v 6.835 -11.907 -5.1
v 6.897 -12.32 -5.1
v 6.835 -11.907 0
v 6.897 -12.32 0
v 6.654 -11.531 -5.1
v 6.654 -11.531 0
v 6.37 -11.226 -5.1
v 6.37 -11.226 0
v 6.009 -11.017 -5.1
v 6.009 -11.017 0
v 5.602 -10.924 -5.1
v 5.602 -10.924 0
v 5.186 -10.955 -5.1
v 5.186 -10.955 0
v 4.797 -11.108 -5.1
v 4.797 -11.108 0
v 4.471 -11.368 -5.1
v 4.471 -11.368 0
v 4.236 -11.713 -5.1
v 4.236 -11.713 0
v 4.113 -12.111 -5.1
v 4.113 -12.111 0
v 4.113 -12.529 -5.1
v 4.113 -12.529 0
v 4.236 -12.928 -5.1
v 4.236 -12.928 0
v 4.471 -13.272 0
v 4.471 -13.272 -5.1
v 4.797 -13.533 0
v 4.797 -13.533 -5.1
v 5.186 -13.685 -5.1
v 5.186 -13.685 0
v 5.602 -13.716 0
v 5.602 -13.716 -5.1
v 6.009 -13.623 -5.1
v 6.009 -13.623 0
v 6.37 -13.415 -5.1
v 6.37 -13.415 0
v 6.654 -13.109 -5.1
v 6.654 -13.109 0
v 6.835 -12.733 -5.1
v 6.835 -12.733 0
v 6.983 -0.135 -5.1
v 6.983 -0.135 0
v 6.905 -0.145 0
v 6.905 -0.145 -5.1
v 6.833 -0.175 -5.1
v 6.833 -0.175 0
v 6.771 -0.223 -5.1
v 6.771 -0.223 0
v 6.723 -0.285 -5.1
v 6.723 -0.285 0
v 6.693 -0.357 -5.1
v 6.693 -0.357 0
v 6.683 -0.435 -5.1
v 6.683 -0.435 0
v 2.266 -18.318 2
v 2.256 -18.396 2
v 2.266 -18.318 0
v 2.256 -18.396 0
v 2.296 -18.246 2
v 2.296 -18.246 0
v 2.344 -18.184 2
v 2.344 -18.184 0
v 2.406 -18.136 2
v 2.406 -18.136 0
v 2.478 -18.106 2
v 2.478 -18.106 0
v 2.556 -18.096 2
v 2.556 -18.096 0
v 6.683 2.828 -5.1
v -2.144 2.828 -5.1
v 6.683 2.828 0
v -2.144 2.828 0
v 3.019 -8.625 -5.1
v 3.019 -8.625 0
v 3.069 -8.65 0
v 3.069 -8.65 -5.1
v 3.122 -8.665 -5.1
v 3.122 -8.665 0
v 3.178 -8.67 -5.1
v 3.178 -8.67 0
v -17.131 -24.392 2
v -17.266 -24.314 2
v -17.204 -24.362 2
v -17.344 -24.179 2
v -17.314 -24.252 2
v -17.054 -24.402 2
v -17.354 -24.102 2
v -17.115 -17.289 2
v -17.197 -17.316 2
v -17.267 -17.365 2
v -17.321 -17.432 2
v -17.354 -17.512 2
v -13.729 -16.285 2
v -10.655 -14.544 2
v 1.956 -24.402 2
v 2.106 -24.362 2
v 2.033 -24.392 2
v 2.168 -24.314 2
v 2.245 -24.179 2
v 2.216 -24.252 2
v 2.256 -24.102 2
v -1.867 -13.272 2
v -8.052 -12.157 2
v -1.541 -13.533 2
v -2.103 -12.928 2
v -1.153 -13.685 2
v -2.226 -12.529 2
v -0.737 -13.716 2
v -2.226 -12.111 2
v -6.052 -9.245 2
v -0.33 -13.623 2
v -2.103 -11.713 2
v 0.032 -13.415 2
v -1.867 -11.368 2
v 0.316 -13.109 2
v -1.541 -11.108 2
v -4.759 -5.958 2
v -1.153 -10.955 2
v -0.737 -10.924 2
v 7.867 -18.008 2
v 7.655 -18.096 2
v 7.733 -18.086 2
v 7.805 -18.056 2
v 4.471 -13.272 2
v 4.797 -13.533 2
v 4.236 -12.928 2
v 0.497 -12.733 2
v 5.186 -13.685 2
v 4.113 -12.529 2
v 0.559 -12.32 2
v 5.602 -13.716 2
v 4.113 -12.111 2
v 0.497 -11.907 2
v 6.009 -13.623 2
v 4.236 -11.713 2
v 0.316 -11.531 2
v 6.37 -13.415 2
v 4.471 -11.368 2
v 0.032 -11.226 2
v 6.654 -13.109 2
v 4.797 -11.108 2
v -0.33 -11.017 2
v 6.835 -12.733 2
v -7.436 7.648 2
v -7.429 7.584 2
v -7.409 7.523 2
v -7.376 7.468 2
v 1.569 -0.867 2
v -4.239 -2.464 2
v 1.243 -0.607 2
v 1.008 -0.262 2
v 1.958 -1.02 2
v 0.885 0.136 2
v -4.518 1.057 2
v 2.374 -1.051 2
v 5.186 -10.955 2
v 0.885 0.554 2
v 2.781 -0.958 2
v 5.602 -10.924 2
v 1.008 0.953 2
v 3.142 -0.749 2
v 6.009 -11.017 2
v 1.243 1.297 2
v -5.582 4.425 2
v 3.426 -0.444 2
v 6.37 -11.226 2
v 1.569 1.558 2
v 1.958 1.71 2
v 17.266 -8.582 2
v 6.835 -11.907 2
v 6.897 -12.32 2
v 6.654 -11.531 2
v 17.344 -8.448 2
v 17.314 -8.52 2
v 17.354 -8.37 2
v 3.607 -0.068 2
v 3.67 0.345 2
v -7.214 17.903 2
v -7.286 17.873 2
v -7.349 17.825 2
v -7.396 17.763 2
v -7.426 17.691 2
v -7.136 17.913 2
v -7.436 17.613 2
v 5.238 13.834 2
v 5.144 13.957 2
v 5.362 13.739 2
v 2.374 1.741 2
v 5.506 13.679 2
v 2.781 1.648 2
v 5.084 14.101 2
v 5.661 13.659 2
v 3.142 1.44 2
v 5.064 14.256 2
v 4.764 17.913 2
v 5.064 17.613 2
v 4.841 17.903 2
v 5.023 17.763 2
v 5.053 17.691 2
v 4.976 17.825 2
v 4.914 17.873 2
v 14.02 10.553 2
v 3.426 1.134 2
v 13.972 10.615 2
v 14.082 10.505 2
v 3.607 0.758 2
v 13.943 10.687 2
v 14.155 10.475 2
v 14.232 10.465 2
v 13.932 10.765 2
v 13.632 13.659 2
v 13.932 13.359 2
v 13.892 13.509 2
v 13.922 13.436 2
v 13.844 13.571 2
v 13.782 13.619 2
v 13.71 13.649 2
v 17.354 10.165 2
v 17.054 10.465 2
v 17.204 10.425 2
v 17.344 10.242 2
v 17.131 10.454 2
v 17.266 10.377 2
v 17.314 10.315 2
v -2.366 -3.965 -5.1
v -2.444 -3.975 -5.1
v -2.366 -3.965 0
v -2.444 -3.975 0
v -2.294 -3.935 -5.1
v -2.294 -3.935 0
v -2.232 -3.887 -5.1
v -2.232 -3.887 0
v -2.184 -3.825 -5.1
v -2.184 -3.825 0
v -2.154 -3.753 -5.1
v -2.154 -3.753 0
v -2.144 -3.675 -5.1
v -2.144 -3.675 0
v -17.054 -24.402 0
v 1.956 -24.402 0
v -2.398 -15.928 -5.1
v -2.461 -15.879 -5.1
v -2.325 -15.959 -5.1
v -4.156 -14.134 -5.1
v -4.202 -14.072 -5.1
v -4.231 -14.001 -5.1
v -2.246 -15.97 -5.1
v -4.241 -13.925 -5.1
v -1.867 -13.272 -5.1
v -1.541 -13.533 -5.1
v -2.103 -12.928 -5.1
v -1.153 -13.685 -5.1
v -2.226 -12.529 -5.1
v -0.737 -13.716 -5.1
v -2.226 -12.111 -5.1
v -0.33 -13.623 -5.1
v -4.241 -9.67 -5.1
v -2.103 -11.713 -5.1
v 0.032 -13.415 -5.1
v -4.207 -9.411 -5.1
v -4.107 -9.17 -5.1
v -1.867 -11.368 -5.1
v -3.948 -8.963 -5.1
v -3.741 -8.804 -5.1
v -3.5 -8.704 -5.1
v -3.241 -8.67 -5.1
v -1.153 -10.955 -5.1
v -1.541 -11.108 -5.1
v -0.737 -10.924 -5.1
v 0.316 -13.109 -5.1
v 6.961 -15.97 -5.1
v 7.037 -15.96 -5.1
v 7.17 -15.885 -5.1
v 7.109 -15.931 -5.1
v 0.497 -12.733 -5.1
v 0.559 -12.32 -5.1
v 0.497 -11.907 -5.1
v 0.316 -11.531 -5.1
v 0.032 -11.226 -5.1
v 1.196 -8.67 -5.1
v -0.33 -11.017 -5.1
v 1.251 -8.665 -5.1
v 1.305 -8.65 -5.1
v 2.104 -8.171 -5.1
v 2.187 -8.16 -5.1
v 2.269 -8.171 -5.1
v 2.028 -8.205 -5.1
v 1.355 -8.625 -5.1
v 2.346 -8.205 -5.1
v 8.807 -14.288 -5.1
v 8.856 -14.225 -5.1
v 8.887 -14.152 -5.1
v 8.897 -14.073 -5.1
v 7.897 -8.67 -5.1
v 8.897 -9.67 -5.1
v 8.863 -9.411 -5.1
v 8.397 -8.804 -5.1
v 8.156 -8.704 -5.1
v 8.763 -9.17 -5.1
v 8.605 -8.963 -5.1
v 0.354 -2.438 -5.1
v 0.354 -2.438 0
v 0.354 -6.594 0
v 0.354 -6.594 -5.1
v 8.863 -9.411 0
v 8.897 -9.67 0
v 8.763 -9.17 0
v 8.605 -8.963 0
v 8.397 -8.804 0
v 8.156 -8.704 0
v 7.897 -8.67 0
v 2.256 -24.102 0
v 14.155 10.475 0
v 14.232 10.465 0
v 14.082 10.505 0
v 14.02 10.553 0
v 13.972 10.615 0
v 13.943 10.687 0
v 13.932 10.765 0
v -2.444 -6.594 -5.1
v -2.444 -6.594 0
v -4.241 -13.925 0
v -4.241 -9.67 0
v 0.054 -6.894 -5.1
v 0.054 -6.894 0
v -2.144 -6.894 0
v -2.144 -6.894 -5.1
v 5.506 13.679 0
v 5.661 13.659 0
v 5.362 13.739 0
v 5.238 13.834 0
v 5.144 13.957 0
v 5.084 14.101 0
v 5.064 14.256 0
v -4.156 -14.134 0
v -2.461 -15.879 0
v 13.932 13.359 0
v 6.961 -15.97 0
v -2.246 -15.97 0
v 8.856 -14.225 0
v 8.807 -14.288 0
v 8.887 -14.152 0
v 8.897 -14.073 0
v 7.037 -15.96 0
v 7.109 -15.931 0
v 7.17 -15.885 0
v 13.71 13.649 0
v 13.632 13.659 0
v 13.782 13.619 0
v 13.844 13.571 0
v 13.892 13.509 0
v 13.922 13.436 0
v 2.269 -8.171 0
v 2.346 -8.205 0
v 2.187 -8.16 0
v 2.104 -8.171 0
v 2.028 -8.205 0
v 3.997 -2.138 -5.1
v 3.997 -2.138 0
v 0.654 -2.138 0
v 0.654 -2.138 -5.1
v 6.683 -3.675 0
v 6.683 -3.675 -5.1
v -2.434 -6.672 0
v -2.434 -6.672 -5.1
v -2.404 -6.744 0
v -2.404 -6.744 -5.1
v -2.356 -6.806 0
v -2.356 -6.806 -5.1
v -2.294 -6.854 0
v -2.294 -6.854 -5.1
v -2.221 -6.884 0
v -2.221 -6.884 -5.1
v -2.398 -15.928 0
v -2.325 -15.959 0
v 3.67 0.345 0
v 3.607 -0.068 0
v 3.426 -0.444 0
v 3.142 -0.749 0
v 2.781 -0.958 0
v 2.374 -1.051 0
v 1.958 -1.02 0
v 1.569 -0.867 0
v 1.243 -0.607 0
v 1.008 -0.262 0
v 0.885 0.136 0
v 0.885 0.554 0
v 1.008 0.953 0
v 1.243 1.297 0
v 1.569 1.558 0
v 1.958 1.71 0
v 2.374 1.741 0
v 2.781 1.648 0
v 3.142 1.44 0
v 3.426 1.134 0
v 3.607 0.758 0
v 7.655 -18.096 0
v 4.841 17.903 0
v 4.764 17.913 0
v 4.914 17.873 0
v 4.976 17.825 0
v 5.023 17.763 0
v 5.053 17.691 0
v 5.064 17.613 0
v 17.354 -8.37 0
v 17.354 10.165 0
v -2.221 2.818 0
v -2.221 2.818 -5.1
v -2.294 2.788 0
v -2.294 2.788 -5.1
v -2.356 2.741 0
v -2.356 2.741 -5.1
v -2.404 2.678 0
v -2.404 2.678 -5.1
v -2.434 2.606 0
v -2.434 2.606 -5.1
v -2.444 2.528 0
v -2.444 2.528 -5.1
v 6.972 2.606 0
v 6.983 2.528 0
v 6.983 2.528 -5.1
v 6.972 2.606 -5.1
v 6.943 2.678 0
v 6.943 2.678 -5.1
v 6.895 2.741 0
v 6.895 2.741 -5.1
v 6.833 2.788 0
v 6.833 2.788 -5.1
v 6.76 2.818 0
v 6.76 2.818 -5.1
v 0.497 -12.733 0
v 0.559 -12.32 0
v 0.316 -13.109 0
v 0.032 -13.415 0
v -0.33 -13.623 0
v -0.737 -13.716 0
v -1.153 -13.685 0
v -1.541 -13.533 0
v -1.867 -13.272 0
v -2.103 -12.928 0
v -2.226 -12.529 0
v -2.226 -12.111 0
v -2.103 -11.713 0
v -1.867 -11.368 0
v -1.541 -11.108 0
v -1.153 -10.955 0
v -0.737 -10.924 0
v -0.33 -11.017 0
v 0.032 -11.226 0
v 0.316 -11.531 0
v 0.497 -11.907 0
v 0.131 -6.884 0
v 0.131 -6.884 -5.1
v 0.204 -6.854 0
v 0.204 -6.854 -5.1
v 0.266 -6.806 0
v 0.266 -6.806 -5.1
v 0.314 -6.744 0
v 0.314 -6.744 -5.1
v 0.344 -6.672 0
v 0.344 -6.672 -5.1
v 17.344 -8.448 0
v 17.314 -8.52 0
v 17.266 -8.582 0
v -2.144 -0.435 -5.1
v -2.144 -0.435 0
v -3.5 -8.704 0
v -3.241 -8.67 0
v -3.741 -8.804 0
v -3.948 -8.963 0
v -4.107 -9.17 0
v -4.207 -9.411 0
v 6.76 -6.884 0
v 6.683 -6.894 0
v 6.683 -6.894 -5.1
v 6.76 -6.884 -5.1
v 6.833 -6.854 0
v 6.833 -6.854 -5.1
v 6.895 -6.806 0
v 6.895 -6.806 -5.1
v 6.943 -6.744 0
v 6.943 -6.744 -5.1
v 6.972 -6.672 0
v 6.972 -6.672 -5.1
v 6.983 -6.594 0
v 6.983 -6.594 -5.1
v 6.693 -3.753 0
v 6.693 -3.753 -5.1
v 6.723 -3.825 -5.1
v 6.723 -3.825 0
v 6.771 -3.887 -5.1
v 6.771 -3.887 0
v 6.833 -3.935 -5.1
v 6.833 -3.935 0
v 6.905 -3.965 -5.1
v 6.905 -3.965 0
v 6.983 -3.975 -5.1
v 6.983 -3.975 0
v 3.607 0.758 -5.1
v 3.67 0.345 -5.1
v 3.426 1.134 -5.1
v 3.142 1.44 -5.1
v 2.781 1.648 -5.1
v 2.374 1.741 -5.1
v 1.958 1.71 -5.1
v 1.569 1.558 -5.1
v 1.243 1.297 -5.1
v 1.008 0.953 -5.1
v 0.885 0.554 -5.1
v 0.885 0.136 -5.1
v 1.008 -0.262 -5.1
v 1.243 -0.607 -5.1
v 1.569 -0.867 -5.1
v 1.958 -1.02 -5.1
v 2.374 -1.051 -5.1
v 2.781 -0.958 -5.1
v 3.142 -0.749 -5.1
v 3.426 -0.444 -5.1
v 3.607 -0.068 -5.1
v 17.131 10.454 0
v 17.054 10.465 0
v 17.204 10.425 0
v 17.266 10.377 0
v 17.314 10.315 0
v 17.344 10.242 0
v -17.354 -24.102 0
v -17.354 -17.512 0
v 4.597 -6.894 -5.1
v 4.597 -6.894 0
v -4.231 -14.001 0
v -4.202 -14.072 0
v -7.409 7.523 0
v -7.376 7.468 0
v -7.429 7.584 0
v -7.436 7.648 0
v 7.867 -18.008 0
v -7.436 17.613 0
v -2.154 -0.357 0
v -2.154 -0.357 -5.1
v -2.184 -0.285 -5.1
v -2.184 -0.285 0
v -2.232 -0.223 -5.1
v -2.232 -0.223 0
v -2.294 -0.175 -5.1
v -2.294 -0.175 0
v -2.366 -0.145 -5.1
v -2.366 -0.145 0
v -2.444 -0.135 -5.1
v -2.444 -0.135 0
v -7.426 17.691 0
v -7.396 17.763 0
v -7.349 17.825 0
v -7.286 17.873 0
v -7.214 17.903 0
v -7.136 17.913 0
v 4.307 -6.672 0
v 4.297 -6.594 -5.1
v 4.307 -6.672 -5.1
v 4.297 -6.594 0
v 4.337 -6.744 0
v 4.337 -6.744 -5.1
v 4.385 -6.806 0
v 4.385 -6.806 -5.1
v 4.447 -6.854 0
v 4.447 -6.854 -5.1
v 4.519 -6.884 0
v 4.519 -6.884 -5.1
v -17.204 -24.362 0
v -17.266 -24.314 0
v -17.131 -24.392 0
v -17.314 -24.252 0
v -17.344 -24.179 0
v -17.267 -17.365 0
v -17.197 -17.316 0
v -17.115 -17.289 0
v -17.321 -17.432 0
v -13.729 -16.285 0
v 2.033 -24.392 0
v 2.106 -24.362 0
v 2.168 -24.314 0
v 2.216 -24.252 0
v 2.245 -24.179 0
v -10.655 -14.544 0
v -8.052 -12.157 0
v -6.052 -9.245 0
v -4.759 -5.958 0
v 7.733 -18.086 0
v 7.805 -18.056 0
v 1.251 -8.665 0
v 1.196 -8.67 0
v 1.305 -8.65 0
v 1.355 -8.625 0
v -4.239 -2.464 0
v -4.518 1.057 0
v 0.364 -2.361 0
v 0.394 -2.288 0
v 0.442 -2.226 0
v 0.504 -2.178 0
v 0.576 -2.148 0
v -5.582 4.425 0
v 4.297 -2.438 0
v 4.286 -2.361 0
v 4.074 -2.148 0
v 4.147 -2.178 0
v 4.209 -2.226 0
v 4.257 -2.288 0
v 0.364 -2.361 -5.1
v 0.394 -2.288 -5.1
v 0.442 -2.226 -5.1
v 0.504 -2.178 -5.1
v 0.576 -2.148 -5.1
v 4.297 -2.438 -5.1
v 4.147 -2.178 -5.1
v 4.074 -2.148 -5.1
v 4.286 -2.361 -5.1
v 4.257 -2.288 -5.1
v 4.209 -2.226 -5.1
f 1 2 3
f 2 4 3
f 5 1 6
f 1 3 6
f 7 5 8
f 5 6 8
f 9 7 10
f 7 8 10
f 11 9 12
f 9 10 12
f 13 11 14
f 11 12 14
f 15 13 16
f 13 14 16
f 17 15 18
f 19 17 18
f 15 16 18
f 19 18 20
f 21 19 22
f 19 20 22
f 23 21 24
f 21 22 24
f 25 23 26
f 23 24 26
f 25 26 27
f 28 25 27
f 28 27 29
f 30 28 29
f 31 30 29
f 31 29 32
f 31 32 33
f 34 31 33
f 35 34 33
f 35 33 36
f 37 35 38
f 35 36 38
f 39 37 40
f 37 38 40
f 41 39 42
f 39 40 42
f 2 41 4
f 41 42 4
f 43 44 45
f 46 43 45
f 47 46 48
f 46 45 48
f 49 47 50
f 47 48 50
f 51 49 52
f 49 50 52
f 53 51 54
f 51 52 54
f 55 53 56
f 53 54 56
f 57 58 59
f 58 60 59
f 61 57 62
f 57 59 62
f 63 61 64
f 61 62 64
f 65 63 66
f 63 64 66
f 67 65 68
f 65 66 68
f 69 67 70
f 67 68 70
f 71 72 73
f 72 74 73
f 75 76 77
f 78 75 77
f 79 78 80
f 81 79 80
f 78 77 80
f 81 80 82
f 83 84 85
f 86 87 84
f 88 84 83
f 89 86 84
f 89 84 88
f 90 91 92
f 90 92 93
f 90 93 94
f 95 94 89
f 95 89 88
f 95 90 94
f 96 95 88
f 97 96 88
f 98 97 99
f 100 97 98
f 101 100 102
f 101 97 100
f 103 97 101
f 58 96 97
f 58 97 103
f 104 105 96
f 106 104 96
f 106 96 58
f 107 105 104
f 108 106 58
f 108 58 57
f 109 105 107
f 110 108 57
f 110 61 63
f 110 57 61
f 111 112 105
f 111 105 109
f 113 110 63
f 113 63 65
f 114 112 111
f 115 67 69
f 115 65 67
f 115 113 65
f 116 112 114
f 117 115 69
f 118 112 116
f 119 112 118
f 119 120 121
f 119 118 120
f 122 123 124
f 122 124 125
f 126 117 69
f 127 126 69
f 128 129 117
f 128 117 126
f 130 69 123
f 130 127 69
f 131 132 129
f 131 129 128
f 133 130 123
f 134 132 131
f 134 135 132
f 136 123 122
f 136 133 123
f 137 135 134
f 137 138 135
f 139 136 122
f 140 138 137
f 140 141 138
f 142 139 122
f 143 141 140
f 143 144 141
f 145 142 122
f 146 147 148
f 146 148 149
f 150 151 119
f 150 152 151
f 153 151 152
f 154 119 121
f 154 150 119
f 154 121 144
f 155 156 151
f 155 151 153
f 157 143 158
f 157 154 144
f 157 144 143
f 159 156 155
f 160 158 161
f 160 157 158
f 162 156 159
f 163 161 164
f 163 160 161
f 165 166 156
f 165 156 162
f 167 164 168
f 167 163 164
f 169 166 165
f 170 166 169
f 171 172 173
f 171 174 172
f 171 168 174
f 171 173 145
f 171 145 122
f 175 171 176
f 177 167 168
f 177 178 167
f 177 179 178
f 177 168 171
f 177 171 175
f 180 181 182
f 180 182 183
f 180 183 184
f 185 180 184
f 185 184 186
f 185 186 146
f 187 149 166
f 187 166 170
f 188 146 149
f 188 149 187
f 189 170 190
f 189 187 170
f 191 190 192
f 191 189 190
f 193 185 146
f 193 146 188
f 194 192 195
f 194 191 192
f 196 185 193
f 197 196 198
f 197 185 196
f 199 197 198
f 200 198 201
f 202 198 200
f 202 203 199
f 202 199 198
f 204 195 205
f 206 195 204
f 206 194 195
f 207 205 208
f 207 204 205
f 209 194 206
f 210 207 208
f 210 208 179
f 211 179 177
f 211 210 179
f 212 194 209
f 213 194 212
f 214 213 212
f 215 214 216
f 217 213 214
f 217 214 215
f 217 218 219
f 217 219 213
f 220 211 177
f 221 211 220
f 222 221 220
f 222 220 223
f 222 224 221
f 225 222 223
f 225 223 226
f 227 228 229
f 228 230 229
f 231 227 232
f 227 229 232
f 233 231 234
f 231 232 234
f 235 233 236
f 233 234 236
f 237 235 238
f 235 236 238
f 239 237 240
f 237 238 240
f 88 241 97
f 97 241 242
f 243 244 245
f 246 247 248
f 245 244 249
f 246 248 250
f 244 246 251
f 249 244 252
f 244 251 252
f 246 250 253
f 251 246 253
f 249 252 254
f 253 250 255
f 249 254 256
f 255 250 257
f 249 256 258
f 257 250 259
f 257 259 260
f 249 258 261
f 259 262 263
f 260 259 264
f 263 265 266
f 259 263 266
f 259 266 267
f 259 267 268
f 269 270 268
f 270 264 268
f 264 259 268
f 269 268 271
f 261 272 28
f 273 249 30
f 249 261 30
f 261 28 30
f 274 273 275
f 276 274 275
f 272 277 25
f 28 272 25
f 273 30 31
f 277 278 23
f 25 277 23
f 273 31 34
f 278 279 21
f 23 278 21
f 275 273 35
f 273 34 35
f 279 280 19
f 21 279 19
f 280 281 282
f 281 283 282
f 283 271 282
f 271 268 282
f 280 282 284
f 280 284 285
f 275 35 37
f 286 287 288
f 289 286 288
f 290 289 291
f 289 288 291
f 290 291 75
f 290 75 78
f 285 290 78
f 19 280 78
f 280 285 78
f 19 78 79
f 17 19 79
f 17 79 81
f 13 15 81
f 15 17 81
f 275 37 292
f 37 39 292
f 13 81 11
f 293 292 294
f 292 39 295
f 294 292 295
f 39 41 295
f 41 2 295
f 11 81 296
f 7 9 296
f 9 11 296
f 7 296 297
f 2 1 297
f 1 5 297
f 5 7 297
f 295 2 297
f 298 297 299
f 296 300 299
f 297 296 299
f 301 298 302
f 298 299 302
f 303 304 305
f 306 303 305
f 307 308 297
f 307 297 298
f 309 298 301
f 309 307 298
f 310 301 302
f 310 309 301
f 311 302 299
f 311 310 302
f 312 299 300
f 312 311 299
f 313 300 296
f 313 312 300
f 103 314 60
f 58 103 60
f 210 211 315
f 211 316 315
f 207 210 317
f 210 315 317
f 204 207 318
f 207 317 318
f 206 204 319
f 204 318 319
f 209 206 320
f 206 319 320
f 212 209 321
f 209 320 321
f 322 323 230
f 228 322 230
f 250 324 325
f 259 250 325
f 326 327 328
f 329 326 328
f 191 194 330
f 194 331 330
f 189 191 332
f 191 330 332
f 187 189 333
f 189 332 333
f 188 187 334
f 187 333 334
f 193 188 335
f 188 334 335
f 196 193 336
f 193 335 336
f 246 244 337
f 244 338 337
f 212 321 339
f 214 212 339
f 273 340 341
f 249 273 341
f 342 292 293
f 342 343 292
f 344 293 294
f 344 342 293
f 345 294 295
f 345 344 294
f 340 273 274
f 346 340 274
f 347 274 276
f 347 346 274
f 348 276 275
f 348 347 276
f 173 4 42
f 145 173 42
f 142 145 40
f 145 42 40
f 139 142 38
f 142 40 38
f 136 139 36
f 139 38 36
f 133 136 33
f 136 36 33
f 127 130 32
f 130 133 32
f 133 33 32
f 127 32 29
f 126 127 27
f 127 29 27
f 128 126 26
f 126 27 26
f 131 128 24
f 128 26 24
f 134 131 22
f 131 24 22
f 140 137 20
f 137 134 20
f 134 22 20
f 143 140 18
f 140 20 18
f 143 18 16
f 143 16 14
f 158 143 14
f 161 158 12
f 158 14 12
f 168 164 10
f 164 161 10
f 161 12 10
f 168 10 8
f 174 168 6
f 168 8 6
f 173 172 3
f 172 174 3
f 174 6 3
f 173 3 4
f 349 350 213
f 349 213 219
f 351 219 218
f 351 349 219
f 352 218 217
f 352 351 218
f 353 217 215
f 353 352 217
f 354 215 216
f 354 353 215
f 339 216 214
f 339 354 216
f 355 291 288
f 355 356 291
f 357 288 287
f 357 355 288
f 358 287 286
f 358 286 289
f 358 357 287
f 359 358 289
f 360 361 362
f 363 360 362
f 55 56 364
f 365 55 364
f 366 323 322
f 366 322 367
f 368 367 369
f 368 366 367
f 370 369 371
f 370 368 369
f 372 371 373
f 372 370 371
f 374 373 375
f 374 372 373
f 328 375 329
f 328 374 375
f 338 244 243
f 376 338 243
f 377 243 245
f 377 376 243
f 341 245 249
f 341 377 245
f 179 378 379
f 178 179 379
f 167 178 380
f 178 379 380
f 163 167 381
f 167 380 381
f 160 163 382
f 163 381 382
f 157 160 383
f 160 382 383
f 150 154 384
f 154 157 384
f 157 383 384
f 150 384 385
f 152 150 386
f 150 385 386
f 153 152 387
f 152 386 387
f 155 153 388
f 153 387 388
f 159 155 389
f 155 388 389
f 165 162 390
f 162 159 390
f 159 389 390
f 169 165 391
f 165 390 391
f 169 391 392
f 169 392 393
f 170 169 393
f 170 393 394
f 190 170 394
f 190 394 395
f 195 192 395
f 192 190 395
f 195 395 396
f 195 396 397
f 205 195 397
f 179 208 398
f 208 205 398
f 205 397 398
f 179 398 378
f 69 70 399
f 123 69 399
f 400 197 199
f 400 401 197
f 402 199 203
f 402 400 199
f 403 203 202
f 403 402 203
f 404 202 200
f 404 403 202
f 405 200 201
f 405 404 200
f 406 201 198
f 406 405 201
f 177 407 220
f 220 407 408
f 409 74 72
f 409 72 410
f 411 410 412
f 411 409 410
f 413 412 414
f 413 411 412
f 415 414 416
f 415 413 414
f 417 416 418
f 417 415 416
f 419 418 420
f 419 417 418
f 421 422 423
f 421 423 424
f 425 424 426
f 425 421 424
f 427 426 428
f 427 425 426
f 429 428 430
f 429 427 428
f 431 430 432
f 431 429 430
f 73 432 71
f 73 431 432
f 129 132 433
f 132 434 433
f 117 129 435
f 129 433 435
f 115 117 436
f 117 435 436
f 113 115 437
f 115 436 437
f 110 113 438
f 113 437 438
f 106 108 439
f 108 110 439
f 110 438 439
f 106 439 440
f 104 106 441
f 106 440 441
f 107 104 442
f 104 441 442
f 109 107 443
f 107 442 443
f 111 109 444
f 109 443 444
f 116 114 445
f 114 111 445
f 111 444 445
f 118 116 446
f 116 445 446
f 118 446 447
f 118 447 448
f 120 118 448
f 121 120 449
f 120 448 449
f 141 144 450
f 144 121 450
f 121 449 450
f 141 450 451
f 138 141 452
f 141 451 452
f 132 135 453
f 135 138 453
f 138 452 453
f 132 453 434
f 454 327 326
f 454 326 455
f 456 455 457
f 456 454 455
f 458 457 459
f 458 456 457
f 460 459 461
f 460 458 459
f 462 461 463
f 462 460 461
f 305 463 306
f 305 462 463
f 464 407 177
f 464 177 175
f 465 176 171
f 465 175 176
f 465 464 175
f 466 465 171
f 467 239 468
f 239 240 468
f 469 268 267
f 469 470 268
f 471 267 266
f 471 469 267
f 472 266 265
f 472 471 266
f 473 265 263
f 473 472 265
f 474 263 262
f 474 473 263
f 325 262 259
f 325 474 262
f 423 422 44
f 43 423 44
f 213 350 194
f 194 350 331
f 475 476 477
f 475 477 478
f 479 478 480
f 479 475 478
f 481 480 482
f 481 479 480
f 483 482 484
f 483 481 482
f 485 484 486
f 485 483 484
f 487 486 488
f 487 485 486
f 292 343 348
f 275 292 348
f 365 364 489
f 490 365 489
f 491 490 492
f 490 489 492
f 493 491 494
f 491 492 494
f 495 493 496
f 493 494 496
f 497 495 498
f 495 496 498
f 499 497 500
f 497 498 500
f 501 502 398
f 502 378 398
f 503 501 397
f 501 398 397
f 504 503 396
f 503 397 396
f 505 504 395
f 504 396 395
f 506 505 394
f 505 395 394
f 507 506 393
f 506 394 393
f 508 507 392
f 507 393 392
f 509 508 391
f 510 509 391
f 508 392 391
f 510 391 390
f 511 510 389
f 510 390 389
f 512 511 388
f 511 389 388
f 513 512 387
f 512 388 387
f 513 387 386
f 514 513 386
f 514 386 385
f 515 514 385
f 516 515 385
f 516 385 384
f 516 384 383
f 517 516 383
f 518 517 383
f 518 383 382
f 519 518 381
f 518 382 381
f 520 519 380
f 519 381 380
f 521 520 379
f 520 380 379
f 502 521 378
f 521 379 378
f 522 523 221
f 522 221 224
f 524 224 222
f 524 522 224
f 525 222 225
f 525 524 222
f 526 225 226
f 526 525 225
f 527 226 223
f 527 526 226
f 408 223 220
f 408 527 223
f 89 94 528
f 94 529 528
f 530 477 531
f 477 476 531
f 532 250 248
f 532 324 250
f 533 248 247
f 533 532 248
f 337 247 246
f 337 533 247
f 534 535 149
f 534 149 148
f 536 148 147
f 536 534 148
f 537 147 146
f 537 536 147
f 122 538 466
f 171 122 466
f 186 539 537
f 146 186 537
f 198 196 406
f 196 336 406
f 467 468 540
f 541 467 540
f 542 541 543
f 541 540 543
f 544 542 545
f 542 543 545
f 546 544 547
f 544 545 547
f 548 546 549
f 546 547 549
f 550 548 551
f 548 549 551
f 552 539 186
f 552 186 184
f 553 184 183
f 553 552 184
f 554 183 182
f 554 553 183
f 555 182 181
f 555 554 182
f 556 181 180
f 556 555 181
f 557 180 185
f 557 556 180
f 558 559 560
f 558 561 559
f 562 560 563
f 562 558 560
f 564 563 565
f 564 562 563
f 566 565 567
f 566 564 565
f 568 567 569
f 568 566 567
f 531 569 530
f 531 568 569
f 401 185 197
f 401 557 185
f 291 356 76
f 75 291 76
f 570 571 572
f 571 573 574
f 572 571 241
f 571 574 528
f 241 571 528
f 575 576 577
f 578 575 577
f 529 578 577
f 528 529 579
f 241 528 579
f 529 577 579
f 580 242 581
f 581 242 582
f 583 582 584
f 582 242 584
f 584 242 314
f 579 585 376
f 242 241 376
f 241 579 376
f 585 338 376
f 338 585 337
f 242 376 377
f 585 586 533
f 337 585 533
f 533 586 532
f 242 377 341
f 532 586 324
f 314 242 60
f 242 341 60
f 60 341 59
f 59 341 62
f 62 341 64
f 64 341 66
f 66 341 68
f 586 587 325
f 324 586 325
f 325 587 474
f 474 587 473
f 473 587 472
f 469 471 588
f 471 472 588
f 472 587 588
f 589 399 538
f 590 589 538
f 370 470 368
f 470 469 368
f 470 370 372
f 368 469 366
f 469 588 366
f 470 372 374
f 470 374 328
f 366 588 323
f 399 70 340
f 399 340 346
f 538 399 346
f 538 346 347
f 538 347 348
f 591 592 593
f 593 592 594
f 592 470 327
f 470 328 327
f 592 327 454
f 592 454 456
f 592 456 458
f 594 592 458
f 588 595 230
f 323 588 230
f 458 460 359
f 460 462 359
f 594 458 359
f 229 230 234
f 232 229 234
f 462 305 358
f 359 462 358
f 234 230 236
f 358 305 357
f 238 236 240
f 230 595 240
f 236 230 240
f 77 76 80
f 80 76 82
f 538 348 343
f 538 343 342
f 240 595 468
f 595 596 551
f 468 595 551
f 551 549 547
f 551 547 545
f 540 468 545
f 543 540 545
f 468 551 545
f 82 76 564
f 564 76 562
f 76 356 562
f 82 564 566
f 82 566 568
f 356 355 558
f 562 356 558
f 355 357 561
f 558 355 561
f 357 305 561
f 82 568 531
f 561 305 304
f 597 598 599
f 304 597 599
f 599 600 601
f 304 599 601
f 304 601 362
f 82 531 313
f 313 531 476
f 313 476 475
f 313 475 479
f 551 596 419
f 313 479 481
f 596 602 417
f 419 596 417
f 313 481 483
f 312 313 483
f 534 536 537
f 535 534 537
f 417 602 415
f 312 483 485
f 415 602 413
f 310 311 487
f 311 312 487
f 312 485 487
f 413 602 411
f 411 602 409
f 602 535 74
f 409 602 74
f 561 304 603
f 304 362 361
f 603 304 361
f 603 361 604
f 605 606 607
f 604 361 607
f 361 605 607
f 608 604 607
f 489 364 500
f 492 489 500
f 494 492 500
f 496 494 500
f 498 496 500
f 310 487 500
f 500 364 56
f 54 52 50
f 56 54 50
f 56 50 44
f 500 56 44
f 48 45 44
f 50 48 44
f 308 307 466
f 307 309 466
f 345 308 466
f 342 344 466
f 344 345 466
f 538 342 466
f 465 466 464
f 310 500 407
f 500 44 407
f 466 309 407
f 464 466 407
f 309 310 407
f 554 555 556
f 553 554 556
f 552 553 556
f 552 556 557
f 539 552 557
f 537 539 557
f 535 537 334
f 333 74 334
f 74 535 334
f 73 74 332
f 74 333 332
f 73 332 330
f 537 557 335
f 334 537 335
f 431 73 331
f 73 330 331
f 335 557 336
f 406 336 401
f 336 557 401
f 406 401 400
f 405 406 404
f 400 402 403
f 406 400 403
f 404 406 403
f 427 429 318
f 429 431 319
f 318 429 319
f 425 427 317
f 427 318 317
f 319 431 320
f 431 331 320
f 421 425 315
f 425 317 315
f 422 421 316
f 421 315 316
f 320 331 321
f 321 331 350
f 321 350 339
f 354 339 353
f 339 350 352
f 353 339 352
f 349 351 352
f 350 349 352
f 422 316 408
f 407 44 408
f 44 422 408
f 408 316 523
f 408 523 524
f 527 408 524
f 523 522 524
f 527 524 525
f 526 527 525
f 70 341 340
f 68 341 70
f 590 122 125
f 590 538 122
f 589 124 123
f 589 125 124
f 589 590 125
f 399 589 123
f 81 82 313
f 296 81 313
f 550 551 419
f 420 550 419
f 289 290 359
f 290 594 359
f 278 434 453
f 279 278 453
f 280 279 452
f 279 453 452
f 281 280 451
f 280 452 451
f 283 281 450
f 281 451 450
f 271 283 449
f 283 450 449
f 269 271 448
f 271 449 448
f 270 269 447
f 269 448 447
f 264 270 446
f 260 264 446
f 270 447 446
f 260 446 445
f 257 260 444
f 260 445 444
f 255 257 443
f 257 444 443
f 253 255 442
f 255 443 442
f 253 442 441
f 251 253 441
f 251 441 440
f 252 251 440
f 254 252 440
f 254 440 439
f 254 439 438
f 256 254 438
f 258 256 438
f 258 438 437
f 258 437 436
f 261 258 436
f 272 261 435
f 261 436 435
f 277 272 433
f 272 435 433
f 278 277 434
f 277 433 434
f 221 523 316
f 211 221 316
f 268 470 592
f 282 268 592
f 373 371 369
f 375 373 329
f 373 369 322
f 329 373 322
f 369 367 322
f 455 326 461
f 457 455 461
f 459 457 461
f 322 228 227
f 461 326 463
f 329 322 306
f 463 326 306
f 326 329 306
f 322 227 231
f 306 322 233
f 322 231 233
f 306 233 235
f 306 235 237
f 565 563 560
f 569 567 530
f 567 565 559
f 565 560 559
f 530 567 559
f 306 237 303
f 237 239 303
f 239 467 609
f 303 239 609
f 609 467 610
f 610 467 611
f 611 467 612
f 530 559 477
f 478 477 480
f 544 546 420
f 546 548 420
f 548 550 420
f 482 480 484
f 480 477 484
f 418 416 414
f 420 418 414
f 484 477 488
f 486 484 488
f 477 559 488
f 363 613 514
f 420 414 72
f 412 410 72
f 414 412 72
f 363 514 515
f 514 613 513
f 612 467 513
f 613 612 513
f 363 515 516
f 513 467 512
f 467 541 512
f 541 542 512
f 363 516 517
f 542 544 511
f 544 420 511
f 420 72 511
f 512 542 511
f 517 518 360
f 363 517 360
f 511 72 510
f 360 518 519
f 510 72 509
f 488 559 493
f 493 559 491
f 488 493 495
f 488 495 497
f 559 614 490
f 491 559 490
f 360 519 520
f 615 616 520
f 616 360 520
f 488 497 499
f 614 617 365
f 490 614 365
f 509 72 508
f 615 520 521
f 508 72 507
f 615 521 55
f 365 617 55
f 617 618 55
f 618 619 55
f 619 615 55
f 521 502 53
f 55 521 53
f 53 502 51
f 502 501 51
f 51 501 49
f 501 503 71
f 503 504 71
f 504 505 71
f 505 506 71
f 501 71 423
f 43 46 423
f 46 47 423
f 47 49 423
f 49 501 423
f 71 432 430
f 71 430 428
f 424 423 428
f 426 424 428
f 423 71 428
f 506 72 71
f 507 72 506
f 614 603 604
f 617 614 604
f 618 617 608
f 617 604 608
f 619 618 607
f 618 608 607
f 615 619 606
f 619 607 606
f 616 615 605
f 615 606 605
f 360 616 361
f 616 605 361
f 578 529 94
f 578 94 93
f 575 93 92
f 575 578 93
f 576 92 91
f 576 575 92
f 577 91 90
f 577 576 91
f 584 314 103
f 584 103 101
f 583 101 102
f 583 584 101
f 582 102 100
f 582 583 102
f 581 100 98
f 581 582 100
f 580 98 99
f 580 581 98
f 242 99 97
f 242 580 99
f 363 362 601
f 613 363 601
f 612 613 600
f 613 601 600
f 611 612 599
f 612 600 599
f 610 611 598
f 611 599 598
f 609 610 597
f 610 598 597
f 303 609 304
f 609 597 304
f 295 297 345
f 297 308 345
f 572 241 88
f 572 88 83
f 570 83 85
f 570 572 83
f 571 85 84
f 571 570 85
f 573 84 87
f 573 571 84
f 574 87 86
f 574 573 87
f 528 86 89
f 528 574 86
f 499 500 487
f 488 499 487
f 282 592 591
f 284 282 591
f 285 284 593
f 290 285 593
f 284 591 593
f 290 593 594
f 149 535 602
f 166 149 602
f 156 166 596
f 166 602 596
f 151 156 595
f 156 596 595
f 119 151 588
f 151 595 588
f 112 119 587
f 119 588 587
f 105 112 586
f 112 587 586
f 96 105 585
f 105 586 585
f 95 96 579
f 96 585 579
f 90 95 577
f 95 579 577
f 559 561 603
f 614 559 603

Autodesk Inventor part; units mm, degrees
ref_plane "YZ Plane" through (0, 0, 0) normal (1, 0, 0) x (0, 1, 0)
ref_plane "Work Plane1" through (-17.3538, -25.3153, -5.1) normal (0, 0, 1) x (1, 0, 0)
sketch "holes" plane through (0, 0, 0) normal (0, 0, 1) x (1, 0, 0)
  arc A0 (17.3538, 10.1647) -> (17.0538, 10.4647) centre (17.0538, 10.1647) ccw
  line L0 (17.0538, 10.4647) -> (14.2323, 10.4647)
  arc A1 (13.9323, 10.7647) -> (14.2323, 10.4647) centre (14.2323, 10.7647) ccw
  line L1 (13.9323, 10.7647) -> (13.9323, 13.3588)
  arc A2 (13.9323, 13.3588) -> (13.6323, 13.6588) centre (13.6323, 13.3588) ccw
  line L2 (13.6323, 13.6588) -> (5.6606, 13.6588)
  arc A3 (5.0636, 14.2558) -> (5.6606, 13.6588) centre (5.6606, 14.2558) ccw
  line L3 (5.0636, 14.2558) -> (5.0636, 17.6129)
  arc A4 (5.0636, 17.6129) -> (4.7636, 17.9129) centre (4.7636, 17.6129) ccw
  line L4 (4.7636, 17.9129) -> (-1.9383, 17.9129)
  arc A5 (-2.2383, 18.2129) -> (-1.9383, 17.9129) centre (-1.9383, 18.2129) ccw
  line L5 (-2.2383, 18.2129) -> (-2.2383, 18.3742)
  arc A6 (-2.2383, 18.3742) -> (-2.5383, 18.6742) centre (-2.5383, 18.3742) ccw
  line L6 (-2.5383, 18.6742) -> (-3.5364, 18.6742)
  arc A7 (-3.8364, 18.9742) -> (-3.5364, 18.6742) centre (-3.5364, 18.9742) ccw
  line L7 (-3.8364, 18.9742) -> (-3.8364, 19.9671)
  arc A8 (-3.8364, 19.9671) -> (-4.1364, 20.2671) centre (-4.1364, 19.9671) ccw
  line L8 (-4.1364, 20.2671) -> (-5.1364, 20.2671)
  arc A9 (-5.4364, 20.5671) -> (-5.1364, 20.2671) centre (-5.1364, 20.5671) ccw
  line L9 (-5.4364, 20.5671) -> (-5.4364, 24.1018)
  arc A10 (-5.4364, 24.1018) -> (-5.7364, 24.4018) centre (-5.7364, 24.1018) ccw
  line L10 (-5.7364, 24.4018) -> (-7.1364, 24.4018)
  arc A11 (-7.1364, 24.4018) -> (-7.4364, 24.1018) centre (-7.1364, 24.1018) ccw
  line L11 (-7.4364, 24.1018) -> (-7.4364, 7.6483)
  arc A12 (-7.4364, 7.6483) -> (-7.3759, 7.4677) centre (-7.1364, 7.6483) ccw
  arc A13 (-17.115, -17.2892) -> (-7.3759, 7.4677) centre (-19.8297, -1.9272) ccw
  arc A14 (-17.115, -17.2892) -> (-17.3538, -17.5116) centre (-17.0628, -17.5846) ccw
  line L12 (-17.3538, -17.5116) -> (-17.3538, -24.1018)
  arc A15 (-17.3538, -24.1018) -> (-17.0538, -24.4018) centre (-17.0538, -24.1018) ccw
  line L13 (-17.0538, -24.4018) -> (1.9557, -24.4018)
  arc A16 (1.9557, -24.4018) -> (2.2557, -24.1018) centre (1.9557, -24.1018) ccw
  line L14 (2.2557, -24.1018) -> (2.2557, -18.3961)
  arc A17 (2.5557, -18.0961) -> (2.2557, -18.3961) centre (2.5557, -18.3961) ccw
  line L15 (2.5557, -18.0961) -> (7.6549, -18.0961)
  arc A18 (7.6549, -18.0961) -> (7.8673, -18.008) centre (7.6549, -17.7961) ccw
  line L16 (7.8673, -18.008) -> (17.2662, -8.5819)
  arc A19 (17.2662, -8.5819) -> (17.3538, -8.3701) centre (17.0538, -8.3701) ccw
  line L17 (17.3538, -8.3701) -> (17.3538, 10.1647)
  arc A20 (1.196, -8.6701) -> (1.3547, -8.6247) centre (1.196, -8.3701) ccw
  line L18 (1.3547, -8.6247) -> (2.0283, -8.2049)
  arc A21 (2.3456, -8.2049) -> (2.0283, -8.2049) centre (2.187, -8.4595) ccw
  line L19 (2.3456, -8.2049) -> (3.0192, -8.6247)
  arc A22 (3.0192, -8.6247) -> (3.1779, -8.6701) centre (3.1779, -8.3701) ccw
  line L20 (3.1779, -8.6701) -> (7.8974, -8.6701)
  arc A23 (8.8974, -9.6701) -> (7.8974, -8.6701) centre (7.8974, -9.6701) ccw
  line L21 (8.8974, -9.6701) -> (8.8974, -14.0729)
  arc A24 (8.8069, -14.2875) -> (8.8974, -14.0729) centre (8.5974, -14.0729) ccw
  line L22 (8.8069, -14.2875) -> (7.1705, -15.8848)
  arc A25 (6.9609, -15.9701) -> (7.1705, -15.8848) centre (6.9609, -15.6701) ccw
  line L23 (6.9609, -15.9701) -> (-2.2459, -15.9701)
  arc A26 (-2.4611, -15.8791) -> (-2.2459, -15.9701) centre (-2.2459, -15.6701) ccw
  line L24 (-2.4611, -15.8791) -> (-4.1564, -14.1338)
  arc A27 (-4.2412, -13.9247) -> (-4.1564, -14.1338) centre (-3.9412, -13.9247) ccw
  line L25 (-4.2412, -13.9247) -> (-4.2412, -9.6701)
  arc A28 (-3.2412, -8.6701) -> (-4.2412, -9.6701) centre (-3.2412, -9.6701) ccw
  line L26 (-3.2412, -8.6701) -> (1.196, -8.6701)
  arc A29 (4.2967, -2.4382) -> (3.9967, -2.1382) centre (3.9967, -2.4382) ccw
  line L27 (3.9967, -2.1382) -> (0.6538, -2.1382)
  arc A30 (0.6538, -2.1382) -> (0.3538, -2.4382) centre (0.6538, -2.4382) ccw
  line L28 (0.3538, -2.4382) -> (0.3538, -6.5942)
  arc A31 (0.0538, -6.8942) -> (0.3538, -6.5942) centre (0.0538, -6.5942) ccw
  line L29 (0.0538, -6.8942) -> (-2.1438, -6.8942)
  arc A32 (-2.4438, -6.5942) -> (-2.1438, -6.8942) centre (-2.1438, -6.5942) ccw
  line L30 (-2.4438, -6.5942) -> (-2.4438, -3.9753)
  arc A33 (-2.4438, -3.9753) -> (-2.1438, -3.6753) centre (-2.4438, -3.6753) ccw
  line L31 (-2.1438, -3.6753) -> (-2.1438, -0.4348)
  arc A34 (-2.1438, -0.4348) -> (-2.4438, -0.1348) centre (-2.4438, -0.4348) ccw
  line L32 (-2.4438, -0.1348) -> (-2.4438, 2.5284)
  arc A35 (-2.1438, 2.8284) -> (-2.4438, 2.5284) centre (-2.1438, 2.5284) ccw
  line L33 (-2.1438, 2.8284) -> (6.6827, 2.8284)
  arc A36 (6.9827, 2.5284) -> (6.6827, 2.8284) centre (6.6827, 2.5284) ccw
  line L34 (6.9827, 2.5284) -> (6.9827, -0.1348)
  arc A37 (6.9827, -0.1348) -> (6.6827, -0.4348) centre (6.9827, -0.4348) ccw
  line L35 (6.6827, -0.4348) -> (6.6827, -3.6753)
  arc A38 (6.6827, -3.6753) -> (6.9827, -3.9753) centre (6.9827, -3.6753) ccw
  line L36 (6.9827, -3.9753) -> (6.9827, -6.5942)
  arc A39 (6.6827, -6.8942) -> (6.9827, -6.5942) centre (6.6827, -6.5942) ccw
  line L37 (6.6827, -6.8942) -> (4.5967, -6.8942)
  arc A40 (4.2967, -6.5942) -> (4.5967, -6.8942) centre (4.5967, -6.5942) ccw
  line L38 (4.2967, -6.5942) -> (4.2967, -2.4382)
  circle A41 centre (2.2695, 0.3451) radius 1.4
  circle A42 centre (5.4974, -12.3201) radius 1.4
  circle A43 centre (-0.8412, -12.3201) radius 1.4
  line L39 (-7.1364, 17.9129) -> (4.7636, 17.9129)
  arc A44 (-7.1364, 17.9129) -> (-7.4364, 17.6129) centre (-7.1364, 17.6129) ccw
  line L40 (-7.4364, 7.6483) -> (-7.4364, 17.6129)
  point P0 (0, 0)
extrude "Extrusion1" add sketch "holes" against normal up to surface (5.1 mm away) contours A20 L18 A21 L19 A22 L20 A23 L21 A24 L22 A25 L23 A26 L24 A27 L25 A28 L26 | A29 L27 A30 L28 A31 L29 A32 L30 A33 L31 A34 L32 A35 L33 A36 L34 A37 L35 A38 L36 A39 L37 A40 L38
ref_plane "Work Plane2" through (282.7327, 0, 0) normal (0, 0, 1) x (1, 0, 0)
sketch "plate" plane through (0, 0, 0) normal (0, 0, 1) x (1, 0, 0)
  arc A0 (17.3538, 10.1647) -> (17.0538, 10.4647) centre (17.0538, 10.1647) ccw projected
  line L0 (17.0538, 10.4647) -> (14.2323, 10.4647) projected
  arc A1 (13.9323, 10.7647) -> (14.2323, 10.4647) centre (14.2323, 10.7647) ccw projected
  line L1 (13.9323, 10.7647) -> (13.9323, 13.3588) projected
  arc A2 (13.9323, 13.3588) -> (13.6323, 13.6588) centre (13.6323, 13.3588) ccw projected
  line L2 (13.6323, 13.6588) -> (5.6606, 13.6588) projected
  arc A3 (5.0636, 14.2558) -> (5.6606, 13.6588) centre (5.6606, 14.2558) ccw projected
  line L3 (5.0636, 14.2558) -> (5.0636, 17.6129) projected
  arc A4 (5.0636, 17.6129) -> (4.7636, 17.9129) centre (4.7636, 17.6129) ccw projected
  line L4 (4.7636, 17.9129) -> (-1.9383, 17.9129) projected
  arc A5 (-2.2383, 18.2129) -> (-1.9383, 17.9129) centre (-1.9383, 18.2129) ccw projected
  line L5 (-2.2383, 18.2129) -> (-2.2383, 18.3742) projected
  arc A6 (-2.2383, 18.3742) -> (-2.5383, 18.6742) centre (-2.5383, 18.3742) ccw projected
  line L6 (-2.5383, 18.6742) -> (-3.5364, 18.6742) projected
  arc A7 (-3.8364, 18.9742) -> (-3.5364, 18.6742) centre (-3.5364, 18.9742) ccw projected
  line L7 (-3.8364, 18.9742) -> (-3.8364, 19.9671) projected
  arc A8 (-3.8364, 19.9671) -> (-4.1364, 20.2671) centre (-4.1364, 19.9671) ccw projected
  line L8 (-4.1364, 20.2671) -> (-5.1364, 20.2671) projected
  arc A9 (-5.4364, 20.5671) -> (-5.1364, 20.2671) centre (-5.1364, 20.5671) ccw projected
  line L9 (-5.4364, 20.5671) -> (-5.4364, 24.1018) projected
  arc A10 (-5.4364, 24.1018) -> (-5.7364, 24.4018) centre (-5.7364, 24.1018) ccw projected
  line L10 (-5.7364, 24.4018) -> (-7.1364, 24.4018) projected
  arc A11 (-7.1364, 24.4018) -> (-7.4364, 24.1018) centre (-7.1364, 24.1018) ccw projected
  line L11 (-7.4364, 24.1018) -> (-7.4364, 7.6483) projected
  arc A12 (-7.4364, 7.6483) -> (-7.3759, 7.4677) centre (-7.1364, 7.6483) ccw projected
  arc A13 (-17.115, -17.2892) -> (-7.3759, 7.4677) centre (-19.8297, -1.9272) ccw projected
  arc A14 (-17.115, -17.2892) -> (-17.3538, -17.5116) centre (-17.0628, -17.5846) ccw projected
  line L12 (-17.3538, -17.5116) -> (-17.3538, -24.1018) projected
  arc A15 (-17.3538, -24.1018) -> (-17.0538, -24.4018) centre (-17.0538, -24.1018) ccw projected
  line L13 (-17.0538, -24.4018) -> (1.9557, -24.4018) projected
  arc A16 (1.9557, -24.4018) -> (2.2557, -24.1018) centre (1.9557, -24.1018) ccw projected
  line L14 (2.2557, -24.1018) -> (2.2557, -18.3961) projected
  arc A17 (2.5557, -18.0961) -> (2.2557, -18.3961) centre (2.5557, -18.3961) ccw projected
  line L15 (2.5557, -18.0961) -> (7.6549, -18.0961) projected
  arc A18 (7.6549, -18.0961) -> (7.8673, -18.008) centre (7.6549, -17.7961) ccw projected
  line L16 (7.8673, -18.008) -> (17.2662, -8.5819) projected
  arc A19 (17.2662, -8.5819) -> (17.3538, -8.3701) centre (17.0538, -8.3701) ccw projected
  line L17 (17.3538, -8.3701) -> (17.3538, 10.1647) projected
  arc A20 (1.196, -8.6701) -> (1.3547, -8.6247) centre (1.196, -8.3701) ccw projected
  line L18 (1.3547, -8.6247) -> (2.0283, -8.2049) projected
  arc A21 (2.3456, -8.2049) -> (2.0283, -8.2049) centre (2.187, -8.4595) ccw projected
  line L19 (2.3456, -8.2049) -> (3.0192, -8.6247) projected
  arc A22 (3.0192, -8.6247) -> (3.1779, -8.6701) centre (3.1779, -8.3701) ccw projected
  line L20 (3.1779, -8.6701) -> (7.8974, -8.6701) projected
  arc A23 (8.8974, -9.6701) -> (7.8974, -8.6701) centre (7.8974, -9.6701) ccw projected
  line L21 (8.8974, -9.6701) -> (8.8974, -14.0729) projected
  arc A24 (8.8069, -14.2875) -> (8.8974, -14.0729) centre (8.5974, -14.0729) ccw projected
  line L22 (8.8069, -14.2875) -> (7.1705, -15.8848) projected
  arc A25 (6.9609, -15.9701) -> (7.1705, -15.8848) centre (6.9609, -15.6701) ccw projected
  line L23 (6.9609, -15.9701) -> (-2.2459, -15.9701) projected
  arc A26 (-2.4611, -15.8791) -> (-2.2459, -15.9701) centre (-2.2459, -15.6701) ccw projected
  line L24 (-2.4611, -15.8791) -> (-4.1564, -14.1338) projected
  arc A27 (-4.2412, -13.9247) -> (-4.1564, -14.1338) centre (-3.9412, -13.9247) ccw projected
  line L25 (-4.2412, -13.9247) -> (-4.2412, -9.6701) projected
  arc A28 (-3.2412, -8.6701) -> (-4.2412, -9.6701) centre (-3.2412, -9.6701) ccw projected
  line L26 (-3.2412, -8.6701) -> (1.196, -8.6701) projected
  arc A29 (4.2967, -2.4382) -> (3.9967, -2.1382) centre (3.9967, -2.4382) ccw projected
  line L27 (3.9967, -2.1382) -> (0.6538, -2.1382) projected
  arc A30 (0.6538, -2.1382) -> (0.3538, -2.4382) centre (0.6538, -2.4382) ccw projected
  line L28 (0.3538, -2.4382) -> (0.3538, -6.5942) projected
  arc A31 (0.0538, -6.8942) -> (0.3538, -6.5942) centre (0.0538, -6.5942) ccw projected
  line L29 (0.0538, -6.8942) -> (-2.1438, -6.8942) projected
  arc A32 (-2.4438, -6.5942) -> (-2.1438, -6.8942) centre (-2.1438, -6.5942) ccw projected
  line L30 (-2.4438, -6.5942) -> (-2.4438, -3.9753) projected
  arc A33 (-2.4438, -3.9753) -> (-2.1438, -3.6753) centre (-2.4438, -3.6753) ccw projected
  line L31 (-2.1438, -3.6753) -> (-2.1438, -0.4348) projected
  arc A34 (-2.1438, -0.4348) -> (-2.4438, -0.1348) centre (-2.4438, -0.4348) ccw projected
  line L32 (-2.4438, -0.1348) -> (-2.4438, 2.5284) projected
  arc A35 (-2.1438, 2.8284) -> (-2.4438, 2.5284) centre (-2.1438, 2.5284) ccw projected
  line L33 (-2.1438, 2.8284) -> (6.6827, 2.8284) projected
  arc A36 (6.9827, 2.5284) -> (6.6827, 2.8284) centre (6.6827, 2.5284) ccw projected
  line L34 (6.9827, 2.5284) -> (6.9827, -0.1348) projected
  arc A37 (6.9827, -0.1348) -> (6.6827, -0.4348) centre (6.9827, -0.4348) ccw projected
  line L35 (6.6827, -0.4348) -> (6.6827, -3.6753) projected
  arc A38 (6.6827, -3.6753) -> (6.9827, -3.9753) centre (6.9827, -3.6753) ccw projected
  line L36 (6.9827, -3.9753) -> (6.9827, -6.5942) projected
  arc A39 (6.6827, -6.8942) -> (6.9827, -6.5942) centre (6.6827, -6.5942) ccw projected
  line L37 (6.6827, -6.8942) -> (4.5967, -6.8942) projected
  arc A40 (4.2967, -6.5942) -> (4.5967, -6.8942) centre (4.5967, -6.5942) ccw projected
  line L38 (4.2967, -6.5942) -> (4.2967, -2.4382) projected
  arc A41 (-7.1364, 17.9129) -> (-7.4364, 17.6129) centre (-7.1364, 17.6129) ccw projected
  line L39 (-7.1364, 17.9129) -> (4.7636, 17.9129) projected
  circle A42 centre (2.2695, 0.3451) radius 1.4 projected
  circle A43 centre (5.4974, -12.3201) radius 1.4 projected
  circle A44 centre (-0.8412, -12.3201) radius 1.4 projected
  point P0 (0, 0)
extrude "Extrusion2" add sketch "plate" along normal blind 2 contours L17 A19 L16 A18 L15 A17 L14 A16 L13 A15 L12 A14 A13 A12 L11 A41 L39 L4 A4 L3 A3 L2 A2 L1 A1 L0 A0 | A20 L18 A21 L19 A22 L20 A23 L21 A24 L22 A25 L23 A26 L24 A27 L25 A28 L26 | A29 L27 A30 L28 A31 L29 A32 L30 A33 L31 A34 L32 A35 L33 A36 L34 A37 L35 A38 L36 A39 L37 A40 L38
properties part number "mount_carriage_bottom"
